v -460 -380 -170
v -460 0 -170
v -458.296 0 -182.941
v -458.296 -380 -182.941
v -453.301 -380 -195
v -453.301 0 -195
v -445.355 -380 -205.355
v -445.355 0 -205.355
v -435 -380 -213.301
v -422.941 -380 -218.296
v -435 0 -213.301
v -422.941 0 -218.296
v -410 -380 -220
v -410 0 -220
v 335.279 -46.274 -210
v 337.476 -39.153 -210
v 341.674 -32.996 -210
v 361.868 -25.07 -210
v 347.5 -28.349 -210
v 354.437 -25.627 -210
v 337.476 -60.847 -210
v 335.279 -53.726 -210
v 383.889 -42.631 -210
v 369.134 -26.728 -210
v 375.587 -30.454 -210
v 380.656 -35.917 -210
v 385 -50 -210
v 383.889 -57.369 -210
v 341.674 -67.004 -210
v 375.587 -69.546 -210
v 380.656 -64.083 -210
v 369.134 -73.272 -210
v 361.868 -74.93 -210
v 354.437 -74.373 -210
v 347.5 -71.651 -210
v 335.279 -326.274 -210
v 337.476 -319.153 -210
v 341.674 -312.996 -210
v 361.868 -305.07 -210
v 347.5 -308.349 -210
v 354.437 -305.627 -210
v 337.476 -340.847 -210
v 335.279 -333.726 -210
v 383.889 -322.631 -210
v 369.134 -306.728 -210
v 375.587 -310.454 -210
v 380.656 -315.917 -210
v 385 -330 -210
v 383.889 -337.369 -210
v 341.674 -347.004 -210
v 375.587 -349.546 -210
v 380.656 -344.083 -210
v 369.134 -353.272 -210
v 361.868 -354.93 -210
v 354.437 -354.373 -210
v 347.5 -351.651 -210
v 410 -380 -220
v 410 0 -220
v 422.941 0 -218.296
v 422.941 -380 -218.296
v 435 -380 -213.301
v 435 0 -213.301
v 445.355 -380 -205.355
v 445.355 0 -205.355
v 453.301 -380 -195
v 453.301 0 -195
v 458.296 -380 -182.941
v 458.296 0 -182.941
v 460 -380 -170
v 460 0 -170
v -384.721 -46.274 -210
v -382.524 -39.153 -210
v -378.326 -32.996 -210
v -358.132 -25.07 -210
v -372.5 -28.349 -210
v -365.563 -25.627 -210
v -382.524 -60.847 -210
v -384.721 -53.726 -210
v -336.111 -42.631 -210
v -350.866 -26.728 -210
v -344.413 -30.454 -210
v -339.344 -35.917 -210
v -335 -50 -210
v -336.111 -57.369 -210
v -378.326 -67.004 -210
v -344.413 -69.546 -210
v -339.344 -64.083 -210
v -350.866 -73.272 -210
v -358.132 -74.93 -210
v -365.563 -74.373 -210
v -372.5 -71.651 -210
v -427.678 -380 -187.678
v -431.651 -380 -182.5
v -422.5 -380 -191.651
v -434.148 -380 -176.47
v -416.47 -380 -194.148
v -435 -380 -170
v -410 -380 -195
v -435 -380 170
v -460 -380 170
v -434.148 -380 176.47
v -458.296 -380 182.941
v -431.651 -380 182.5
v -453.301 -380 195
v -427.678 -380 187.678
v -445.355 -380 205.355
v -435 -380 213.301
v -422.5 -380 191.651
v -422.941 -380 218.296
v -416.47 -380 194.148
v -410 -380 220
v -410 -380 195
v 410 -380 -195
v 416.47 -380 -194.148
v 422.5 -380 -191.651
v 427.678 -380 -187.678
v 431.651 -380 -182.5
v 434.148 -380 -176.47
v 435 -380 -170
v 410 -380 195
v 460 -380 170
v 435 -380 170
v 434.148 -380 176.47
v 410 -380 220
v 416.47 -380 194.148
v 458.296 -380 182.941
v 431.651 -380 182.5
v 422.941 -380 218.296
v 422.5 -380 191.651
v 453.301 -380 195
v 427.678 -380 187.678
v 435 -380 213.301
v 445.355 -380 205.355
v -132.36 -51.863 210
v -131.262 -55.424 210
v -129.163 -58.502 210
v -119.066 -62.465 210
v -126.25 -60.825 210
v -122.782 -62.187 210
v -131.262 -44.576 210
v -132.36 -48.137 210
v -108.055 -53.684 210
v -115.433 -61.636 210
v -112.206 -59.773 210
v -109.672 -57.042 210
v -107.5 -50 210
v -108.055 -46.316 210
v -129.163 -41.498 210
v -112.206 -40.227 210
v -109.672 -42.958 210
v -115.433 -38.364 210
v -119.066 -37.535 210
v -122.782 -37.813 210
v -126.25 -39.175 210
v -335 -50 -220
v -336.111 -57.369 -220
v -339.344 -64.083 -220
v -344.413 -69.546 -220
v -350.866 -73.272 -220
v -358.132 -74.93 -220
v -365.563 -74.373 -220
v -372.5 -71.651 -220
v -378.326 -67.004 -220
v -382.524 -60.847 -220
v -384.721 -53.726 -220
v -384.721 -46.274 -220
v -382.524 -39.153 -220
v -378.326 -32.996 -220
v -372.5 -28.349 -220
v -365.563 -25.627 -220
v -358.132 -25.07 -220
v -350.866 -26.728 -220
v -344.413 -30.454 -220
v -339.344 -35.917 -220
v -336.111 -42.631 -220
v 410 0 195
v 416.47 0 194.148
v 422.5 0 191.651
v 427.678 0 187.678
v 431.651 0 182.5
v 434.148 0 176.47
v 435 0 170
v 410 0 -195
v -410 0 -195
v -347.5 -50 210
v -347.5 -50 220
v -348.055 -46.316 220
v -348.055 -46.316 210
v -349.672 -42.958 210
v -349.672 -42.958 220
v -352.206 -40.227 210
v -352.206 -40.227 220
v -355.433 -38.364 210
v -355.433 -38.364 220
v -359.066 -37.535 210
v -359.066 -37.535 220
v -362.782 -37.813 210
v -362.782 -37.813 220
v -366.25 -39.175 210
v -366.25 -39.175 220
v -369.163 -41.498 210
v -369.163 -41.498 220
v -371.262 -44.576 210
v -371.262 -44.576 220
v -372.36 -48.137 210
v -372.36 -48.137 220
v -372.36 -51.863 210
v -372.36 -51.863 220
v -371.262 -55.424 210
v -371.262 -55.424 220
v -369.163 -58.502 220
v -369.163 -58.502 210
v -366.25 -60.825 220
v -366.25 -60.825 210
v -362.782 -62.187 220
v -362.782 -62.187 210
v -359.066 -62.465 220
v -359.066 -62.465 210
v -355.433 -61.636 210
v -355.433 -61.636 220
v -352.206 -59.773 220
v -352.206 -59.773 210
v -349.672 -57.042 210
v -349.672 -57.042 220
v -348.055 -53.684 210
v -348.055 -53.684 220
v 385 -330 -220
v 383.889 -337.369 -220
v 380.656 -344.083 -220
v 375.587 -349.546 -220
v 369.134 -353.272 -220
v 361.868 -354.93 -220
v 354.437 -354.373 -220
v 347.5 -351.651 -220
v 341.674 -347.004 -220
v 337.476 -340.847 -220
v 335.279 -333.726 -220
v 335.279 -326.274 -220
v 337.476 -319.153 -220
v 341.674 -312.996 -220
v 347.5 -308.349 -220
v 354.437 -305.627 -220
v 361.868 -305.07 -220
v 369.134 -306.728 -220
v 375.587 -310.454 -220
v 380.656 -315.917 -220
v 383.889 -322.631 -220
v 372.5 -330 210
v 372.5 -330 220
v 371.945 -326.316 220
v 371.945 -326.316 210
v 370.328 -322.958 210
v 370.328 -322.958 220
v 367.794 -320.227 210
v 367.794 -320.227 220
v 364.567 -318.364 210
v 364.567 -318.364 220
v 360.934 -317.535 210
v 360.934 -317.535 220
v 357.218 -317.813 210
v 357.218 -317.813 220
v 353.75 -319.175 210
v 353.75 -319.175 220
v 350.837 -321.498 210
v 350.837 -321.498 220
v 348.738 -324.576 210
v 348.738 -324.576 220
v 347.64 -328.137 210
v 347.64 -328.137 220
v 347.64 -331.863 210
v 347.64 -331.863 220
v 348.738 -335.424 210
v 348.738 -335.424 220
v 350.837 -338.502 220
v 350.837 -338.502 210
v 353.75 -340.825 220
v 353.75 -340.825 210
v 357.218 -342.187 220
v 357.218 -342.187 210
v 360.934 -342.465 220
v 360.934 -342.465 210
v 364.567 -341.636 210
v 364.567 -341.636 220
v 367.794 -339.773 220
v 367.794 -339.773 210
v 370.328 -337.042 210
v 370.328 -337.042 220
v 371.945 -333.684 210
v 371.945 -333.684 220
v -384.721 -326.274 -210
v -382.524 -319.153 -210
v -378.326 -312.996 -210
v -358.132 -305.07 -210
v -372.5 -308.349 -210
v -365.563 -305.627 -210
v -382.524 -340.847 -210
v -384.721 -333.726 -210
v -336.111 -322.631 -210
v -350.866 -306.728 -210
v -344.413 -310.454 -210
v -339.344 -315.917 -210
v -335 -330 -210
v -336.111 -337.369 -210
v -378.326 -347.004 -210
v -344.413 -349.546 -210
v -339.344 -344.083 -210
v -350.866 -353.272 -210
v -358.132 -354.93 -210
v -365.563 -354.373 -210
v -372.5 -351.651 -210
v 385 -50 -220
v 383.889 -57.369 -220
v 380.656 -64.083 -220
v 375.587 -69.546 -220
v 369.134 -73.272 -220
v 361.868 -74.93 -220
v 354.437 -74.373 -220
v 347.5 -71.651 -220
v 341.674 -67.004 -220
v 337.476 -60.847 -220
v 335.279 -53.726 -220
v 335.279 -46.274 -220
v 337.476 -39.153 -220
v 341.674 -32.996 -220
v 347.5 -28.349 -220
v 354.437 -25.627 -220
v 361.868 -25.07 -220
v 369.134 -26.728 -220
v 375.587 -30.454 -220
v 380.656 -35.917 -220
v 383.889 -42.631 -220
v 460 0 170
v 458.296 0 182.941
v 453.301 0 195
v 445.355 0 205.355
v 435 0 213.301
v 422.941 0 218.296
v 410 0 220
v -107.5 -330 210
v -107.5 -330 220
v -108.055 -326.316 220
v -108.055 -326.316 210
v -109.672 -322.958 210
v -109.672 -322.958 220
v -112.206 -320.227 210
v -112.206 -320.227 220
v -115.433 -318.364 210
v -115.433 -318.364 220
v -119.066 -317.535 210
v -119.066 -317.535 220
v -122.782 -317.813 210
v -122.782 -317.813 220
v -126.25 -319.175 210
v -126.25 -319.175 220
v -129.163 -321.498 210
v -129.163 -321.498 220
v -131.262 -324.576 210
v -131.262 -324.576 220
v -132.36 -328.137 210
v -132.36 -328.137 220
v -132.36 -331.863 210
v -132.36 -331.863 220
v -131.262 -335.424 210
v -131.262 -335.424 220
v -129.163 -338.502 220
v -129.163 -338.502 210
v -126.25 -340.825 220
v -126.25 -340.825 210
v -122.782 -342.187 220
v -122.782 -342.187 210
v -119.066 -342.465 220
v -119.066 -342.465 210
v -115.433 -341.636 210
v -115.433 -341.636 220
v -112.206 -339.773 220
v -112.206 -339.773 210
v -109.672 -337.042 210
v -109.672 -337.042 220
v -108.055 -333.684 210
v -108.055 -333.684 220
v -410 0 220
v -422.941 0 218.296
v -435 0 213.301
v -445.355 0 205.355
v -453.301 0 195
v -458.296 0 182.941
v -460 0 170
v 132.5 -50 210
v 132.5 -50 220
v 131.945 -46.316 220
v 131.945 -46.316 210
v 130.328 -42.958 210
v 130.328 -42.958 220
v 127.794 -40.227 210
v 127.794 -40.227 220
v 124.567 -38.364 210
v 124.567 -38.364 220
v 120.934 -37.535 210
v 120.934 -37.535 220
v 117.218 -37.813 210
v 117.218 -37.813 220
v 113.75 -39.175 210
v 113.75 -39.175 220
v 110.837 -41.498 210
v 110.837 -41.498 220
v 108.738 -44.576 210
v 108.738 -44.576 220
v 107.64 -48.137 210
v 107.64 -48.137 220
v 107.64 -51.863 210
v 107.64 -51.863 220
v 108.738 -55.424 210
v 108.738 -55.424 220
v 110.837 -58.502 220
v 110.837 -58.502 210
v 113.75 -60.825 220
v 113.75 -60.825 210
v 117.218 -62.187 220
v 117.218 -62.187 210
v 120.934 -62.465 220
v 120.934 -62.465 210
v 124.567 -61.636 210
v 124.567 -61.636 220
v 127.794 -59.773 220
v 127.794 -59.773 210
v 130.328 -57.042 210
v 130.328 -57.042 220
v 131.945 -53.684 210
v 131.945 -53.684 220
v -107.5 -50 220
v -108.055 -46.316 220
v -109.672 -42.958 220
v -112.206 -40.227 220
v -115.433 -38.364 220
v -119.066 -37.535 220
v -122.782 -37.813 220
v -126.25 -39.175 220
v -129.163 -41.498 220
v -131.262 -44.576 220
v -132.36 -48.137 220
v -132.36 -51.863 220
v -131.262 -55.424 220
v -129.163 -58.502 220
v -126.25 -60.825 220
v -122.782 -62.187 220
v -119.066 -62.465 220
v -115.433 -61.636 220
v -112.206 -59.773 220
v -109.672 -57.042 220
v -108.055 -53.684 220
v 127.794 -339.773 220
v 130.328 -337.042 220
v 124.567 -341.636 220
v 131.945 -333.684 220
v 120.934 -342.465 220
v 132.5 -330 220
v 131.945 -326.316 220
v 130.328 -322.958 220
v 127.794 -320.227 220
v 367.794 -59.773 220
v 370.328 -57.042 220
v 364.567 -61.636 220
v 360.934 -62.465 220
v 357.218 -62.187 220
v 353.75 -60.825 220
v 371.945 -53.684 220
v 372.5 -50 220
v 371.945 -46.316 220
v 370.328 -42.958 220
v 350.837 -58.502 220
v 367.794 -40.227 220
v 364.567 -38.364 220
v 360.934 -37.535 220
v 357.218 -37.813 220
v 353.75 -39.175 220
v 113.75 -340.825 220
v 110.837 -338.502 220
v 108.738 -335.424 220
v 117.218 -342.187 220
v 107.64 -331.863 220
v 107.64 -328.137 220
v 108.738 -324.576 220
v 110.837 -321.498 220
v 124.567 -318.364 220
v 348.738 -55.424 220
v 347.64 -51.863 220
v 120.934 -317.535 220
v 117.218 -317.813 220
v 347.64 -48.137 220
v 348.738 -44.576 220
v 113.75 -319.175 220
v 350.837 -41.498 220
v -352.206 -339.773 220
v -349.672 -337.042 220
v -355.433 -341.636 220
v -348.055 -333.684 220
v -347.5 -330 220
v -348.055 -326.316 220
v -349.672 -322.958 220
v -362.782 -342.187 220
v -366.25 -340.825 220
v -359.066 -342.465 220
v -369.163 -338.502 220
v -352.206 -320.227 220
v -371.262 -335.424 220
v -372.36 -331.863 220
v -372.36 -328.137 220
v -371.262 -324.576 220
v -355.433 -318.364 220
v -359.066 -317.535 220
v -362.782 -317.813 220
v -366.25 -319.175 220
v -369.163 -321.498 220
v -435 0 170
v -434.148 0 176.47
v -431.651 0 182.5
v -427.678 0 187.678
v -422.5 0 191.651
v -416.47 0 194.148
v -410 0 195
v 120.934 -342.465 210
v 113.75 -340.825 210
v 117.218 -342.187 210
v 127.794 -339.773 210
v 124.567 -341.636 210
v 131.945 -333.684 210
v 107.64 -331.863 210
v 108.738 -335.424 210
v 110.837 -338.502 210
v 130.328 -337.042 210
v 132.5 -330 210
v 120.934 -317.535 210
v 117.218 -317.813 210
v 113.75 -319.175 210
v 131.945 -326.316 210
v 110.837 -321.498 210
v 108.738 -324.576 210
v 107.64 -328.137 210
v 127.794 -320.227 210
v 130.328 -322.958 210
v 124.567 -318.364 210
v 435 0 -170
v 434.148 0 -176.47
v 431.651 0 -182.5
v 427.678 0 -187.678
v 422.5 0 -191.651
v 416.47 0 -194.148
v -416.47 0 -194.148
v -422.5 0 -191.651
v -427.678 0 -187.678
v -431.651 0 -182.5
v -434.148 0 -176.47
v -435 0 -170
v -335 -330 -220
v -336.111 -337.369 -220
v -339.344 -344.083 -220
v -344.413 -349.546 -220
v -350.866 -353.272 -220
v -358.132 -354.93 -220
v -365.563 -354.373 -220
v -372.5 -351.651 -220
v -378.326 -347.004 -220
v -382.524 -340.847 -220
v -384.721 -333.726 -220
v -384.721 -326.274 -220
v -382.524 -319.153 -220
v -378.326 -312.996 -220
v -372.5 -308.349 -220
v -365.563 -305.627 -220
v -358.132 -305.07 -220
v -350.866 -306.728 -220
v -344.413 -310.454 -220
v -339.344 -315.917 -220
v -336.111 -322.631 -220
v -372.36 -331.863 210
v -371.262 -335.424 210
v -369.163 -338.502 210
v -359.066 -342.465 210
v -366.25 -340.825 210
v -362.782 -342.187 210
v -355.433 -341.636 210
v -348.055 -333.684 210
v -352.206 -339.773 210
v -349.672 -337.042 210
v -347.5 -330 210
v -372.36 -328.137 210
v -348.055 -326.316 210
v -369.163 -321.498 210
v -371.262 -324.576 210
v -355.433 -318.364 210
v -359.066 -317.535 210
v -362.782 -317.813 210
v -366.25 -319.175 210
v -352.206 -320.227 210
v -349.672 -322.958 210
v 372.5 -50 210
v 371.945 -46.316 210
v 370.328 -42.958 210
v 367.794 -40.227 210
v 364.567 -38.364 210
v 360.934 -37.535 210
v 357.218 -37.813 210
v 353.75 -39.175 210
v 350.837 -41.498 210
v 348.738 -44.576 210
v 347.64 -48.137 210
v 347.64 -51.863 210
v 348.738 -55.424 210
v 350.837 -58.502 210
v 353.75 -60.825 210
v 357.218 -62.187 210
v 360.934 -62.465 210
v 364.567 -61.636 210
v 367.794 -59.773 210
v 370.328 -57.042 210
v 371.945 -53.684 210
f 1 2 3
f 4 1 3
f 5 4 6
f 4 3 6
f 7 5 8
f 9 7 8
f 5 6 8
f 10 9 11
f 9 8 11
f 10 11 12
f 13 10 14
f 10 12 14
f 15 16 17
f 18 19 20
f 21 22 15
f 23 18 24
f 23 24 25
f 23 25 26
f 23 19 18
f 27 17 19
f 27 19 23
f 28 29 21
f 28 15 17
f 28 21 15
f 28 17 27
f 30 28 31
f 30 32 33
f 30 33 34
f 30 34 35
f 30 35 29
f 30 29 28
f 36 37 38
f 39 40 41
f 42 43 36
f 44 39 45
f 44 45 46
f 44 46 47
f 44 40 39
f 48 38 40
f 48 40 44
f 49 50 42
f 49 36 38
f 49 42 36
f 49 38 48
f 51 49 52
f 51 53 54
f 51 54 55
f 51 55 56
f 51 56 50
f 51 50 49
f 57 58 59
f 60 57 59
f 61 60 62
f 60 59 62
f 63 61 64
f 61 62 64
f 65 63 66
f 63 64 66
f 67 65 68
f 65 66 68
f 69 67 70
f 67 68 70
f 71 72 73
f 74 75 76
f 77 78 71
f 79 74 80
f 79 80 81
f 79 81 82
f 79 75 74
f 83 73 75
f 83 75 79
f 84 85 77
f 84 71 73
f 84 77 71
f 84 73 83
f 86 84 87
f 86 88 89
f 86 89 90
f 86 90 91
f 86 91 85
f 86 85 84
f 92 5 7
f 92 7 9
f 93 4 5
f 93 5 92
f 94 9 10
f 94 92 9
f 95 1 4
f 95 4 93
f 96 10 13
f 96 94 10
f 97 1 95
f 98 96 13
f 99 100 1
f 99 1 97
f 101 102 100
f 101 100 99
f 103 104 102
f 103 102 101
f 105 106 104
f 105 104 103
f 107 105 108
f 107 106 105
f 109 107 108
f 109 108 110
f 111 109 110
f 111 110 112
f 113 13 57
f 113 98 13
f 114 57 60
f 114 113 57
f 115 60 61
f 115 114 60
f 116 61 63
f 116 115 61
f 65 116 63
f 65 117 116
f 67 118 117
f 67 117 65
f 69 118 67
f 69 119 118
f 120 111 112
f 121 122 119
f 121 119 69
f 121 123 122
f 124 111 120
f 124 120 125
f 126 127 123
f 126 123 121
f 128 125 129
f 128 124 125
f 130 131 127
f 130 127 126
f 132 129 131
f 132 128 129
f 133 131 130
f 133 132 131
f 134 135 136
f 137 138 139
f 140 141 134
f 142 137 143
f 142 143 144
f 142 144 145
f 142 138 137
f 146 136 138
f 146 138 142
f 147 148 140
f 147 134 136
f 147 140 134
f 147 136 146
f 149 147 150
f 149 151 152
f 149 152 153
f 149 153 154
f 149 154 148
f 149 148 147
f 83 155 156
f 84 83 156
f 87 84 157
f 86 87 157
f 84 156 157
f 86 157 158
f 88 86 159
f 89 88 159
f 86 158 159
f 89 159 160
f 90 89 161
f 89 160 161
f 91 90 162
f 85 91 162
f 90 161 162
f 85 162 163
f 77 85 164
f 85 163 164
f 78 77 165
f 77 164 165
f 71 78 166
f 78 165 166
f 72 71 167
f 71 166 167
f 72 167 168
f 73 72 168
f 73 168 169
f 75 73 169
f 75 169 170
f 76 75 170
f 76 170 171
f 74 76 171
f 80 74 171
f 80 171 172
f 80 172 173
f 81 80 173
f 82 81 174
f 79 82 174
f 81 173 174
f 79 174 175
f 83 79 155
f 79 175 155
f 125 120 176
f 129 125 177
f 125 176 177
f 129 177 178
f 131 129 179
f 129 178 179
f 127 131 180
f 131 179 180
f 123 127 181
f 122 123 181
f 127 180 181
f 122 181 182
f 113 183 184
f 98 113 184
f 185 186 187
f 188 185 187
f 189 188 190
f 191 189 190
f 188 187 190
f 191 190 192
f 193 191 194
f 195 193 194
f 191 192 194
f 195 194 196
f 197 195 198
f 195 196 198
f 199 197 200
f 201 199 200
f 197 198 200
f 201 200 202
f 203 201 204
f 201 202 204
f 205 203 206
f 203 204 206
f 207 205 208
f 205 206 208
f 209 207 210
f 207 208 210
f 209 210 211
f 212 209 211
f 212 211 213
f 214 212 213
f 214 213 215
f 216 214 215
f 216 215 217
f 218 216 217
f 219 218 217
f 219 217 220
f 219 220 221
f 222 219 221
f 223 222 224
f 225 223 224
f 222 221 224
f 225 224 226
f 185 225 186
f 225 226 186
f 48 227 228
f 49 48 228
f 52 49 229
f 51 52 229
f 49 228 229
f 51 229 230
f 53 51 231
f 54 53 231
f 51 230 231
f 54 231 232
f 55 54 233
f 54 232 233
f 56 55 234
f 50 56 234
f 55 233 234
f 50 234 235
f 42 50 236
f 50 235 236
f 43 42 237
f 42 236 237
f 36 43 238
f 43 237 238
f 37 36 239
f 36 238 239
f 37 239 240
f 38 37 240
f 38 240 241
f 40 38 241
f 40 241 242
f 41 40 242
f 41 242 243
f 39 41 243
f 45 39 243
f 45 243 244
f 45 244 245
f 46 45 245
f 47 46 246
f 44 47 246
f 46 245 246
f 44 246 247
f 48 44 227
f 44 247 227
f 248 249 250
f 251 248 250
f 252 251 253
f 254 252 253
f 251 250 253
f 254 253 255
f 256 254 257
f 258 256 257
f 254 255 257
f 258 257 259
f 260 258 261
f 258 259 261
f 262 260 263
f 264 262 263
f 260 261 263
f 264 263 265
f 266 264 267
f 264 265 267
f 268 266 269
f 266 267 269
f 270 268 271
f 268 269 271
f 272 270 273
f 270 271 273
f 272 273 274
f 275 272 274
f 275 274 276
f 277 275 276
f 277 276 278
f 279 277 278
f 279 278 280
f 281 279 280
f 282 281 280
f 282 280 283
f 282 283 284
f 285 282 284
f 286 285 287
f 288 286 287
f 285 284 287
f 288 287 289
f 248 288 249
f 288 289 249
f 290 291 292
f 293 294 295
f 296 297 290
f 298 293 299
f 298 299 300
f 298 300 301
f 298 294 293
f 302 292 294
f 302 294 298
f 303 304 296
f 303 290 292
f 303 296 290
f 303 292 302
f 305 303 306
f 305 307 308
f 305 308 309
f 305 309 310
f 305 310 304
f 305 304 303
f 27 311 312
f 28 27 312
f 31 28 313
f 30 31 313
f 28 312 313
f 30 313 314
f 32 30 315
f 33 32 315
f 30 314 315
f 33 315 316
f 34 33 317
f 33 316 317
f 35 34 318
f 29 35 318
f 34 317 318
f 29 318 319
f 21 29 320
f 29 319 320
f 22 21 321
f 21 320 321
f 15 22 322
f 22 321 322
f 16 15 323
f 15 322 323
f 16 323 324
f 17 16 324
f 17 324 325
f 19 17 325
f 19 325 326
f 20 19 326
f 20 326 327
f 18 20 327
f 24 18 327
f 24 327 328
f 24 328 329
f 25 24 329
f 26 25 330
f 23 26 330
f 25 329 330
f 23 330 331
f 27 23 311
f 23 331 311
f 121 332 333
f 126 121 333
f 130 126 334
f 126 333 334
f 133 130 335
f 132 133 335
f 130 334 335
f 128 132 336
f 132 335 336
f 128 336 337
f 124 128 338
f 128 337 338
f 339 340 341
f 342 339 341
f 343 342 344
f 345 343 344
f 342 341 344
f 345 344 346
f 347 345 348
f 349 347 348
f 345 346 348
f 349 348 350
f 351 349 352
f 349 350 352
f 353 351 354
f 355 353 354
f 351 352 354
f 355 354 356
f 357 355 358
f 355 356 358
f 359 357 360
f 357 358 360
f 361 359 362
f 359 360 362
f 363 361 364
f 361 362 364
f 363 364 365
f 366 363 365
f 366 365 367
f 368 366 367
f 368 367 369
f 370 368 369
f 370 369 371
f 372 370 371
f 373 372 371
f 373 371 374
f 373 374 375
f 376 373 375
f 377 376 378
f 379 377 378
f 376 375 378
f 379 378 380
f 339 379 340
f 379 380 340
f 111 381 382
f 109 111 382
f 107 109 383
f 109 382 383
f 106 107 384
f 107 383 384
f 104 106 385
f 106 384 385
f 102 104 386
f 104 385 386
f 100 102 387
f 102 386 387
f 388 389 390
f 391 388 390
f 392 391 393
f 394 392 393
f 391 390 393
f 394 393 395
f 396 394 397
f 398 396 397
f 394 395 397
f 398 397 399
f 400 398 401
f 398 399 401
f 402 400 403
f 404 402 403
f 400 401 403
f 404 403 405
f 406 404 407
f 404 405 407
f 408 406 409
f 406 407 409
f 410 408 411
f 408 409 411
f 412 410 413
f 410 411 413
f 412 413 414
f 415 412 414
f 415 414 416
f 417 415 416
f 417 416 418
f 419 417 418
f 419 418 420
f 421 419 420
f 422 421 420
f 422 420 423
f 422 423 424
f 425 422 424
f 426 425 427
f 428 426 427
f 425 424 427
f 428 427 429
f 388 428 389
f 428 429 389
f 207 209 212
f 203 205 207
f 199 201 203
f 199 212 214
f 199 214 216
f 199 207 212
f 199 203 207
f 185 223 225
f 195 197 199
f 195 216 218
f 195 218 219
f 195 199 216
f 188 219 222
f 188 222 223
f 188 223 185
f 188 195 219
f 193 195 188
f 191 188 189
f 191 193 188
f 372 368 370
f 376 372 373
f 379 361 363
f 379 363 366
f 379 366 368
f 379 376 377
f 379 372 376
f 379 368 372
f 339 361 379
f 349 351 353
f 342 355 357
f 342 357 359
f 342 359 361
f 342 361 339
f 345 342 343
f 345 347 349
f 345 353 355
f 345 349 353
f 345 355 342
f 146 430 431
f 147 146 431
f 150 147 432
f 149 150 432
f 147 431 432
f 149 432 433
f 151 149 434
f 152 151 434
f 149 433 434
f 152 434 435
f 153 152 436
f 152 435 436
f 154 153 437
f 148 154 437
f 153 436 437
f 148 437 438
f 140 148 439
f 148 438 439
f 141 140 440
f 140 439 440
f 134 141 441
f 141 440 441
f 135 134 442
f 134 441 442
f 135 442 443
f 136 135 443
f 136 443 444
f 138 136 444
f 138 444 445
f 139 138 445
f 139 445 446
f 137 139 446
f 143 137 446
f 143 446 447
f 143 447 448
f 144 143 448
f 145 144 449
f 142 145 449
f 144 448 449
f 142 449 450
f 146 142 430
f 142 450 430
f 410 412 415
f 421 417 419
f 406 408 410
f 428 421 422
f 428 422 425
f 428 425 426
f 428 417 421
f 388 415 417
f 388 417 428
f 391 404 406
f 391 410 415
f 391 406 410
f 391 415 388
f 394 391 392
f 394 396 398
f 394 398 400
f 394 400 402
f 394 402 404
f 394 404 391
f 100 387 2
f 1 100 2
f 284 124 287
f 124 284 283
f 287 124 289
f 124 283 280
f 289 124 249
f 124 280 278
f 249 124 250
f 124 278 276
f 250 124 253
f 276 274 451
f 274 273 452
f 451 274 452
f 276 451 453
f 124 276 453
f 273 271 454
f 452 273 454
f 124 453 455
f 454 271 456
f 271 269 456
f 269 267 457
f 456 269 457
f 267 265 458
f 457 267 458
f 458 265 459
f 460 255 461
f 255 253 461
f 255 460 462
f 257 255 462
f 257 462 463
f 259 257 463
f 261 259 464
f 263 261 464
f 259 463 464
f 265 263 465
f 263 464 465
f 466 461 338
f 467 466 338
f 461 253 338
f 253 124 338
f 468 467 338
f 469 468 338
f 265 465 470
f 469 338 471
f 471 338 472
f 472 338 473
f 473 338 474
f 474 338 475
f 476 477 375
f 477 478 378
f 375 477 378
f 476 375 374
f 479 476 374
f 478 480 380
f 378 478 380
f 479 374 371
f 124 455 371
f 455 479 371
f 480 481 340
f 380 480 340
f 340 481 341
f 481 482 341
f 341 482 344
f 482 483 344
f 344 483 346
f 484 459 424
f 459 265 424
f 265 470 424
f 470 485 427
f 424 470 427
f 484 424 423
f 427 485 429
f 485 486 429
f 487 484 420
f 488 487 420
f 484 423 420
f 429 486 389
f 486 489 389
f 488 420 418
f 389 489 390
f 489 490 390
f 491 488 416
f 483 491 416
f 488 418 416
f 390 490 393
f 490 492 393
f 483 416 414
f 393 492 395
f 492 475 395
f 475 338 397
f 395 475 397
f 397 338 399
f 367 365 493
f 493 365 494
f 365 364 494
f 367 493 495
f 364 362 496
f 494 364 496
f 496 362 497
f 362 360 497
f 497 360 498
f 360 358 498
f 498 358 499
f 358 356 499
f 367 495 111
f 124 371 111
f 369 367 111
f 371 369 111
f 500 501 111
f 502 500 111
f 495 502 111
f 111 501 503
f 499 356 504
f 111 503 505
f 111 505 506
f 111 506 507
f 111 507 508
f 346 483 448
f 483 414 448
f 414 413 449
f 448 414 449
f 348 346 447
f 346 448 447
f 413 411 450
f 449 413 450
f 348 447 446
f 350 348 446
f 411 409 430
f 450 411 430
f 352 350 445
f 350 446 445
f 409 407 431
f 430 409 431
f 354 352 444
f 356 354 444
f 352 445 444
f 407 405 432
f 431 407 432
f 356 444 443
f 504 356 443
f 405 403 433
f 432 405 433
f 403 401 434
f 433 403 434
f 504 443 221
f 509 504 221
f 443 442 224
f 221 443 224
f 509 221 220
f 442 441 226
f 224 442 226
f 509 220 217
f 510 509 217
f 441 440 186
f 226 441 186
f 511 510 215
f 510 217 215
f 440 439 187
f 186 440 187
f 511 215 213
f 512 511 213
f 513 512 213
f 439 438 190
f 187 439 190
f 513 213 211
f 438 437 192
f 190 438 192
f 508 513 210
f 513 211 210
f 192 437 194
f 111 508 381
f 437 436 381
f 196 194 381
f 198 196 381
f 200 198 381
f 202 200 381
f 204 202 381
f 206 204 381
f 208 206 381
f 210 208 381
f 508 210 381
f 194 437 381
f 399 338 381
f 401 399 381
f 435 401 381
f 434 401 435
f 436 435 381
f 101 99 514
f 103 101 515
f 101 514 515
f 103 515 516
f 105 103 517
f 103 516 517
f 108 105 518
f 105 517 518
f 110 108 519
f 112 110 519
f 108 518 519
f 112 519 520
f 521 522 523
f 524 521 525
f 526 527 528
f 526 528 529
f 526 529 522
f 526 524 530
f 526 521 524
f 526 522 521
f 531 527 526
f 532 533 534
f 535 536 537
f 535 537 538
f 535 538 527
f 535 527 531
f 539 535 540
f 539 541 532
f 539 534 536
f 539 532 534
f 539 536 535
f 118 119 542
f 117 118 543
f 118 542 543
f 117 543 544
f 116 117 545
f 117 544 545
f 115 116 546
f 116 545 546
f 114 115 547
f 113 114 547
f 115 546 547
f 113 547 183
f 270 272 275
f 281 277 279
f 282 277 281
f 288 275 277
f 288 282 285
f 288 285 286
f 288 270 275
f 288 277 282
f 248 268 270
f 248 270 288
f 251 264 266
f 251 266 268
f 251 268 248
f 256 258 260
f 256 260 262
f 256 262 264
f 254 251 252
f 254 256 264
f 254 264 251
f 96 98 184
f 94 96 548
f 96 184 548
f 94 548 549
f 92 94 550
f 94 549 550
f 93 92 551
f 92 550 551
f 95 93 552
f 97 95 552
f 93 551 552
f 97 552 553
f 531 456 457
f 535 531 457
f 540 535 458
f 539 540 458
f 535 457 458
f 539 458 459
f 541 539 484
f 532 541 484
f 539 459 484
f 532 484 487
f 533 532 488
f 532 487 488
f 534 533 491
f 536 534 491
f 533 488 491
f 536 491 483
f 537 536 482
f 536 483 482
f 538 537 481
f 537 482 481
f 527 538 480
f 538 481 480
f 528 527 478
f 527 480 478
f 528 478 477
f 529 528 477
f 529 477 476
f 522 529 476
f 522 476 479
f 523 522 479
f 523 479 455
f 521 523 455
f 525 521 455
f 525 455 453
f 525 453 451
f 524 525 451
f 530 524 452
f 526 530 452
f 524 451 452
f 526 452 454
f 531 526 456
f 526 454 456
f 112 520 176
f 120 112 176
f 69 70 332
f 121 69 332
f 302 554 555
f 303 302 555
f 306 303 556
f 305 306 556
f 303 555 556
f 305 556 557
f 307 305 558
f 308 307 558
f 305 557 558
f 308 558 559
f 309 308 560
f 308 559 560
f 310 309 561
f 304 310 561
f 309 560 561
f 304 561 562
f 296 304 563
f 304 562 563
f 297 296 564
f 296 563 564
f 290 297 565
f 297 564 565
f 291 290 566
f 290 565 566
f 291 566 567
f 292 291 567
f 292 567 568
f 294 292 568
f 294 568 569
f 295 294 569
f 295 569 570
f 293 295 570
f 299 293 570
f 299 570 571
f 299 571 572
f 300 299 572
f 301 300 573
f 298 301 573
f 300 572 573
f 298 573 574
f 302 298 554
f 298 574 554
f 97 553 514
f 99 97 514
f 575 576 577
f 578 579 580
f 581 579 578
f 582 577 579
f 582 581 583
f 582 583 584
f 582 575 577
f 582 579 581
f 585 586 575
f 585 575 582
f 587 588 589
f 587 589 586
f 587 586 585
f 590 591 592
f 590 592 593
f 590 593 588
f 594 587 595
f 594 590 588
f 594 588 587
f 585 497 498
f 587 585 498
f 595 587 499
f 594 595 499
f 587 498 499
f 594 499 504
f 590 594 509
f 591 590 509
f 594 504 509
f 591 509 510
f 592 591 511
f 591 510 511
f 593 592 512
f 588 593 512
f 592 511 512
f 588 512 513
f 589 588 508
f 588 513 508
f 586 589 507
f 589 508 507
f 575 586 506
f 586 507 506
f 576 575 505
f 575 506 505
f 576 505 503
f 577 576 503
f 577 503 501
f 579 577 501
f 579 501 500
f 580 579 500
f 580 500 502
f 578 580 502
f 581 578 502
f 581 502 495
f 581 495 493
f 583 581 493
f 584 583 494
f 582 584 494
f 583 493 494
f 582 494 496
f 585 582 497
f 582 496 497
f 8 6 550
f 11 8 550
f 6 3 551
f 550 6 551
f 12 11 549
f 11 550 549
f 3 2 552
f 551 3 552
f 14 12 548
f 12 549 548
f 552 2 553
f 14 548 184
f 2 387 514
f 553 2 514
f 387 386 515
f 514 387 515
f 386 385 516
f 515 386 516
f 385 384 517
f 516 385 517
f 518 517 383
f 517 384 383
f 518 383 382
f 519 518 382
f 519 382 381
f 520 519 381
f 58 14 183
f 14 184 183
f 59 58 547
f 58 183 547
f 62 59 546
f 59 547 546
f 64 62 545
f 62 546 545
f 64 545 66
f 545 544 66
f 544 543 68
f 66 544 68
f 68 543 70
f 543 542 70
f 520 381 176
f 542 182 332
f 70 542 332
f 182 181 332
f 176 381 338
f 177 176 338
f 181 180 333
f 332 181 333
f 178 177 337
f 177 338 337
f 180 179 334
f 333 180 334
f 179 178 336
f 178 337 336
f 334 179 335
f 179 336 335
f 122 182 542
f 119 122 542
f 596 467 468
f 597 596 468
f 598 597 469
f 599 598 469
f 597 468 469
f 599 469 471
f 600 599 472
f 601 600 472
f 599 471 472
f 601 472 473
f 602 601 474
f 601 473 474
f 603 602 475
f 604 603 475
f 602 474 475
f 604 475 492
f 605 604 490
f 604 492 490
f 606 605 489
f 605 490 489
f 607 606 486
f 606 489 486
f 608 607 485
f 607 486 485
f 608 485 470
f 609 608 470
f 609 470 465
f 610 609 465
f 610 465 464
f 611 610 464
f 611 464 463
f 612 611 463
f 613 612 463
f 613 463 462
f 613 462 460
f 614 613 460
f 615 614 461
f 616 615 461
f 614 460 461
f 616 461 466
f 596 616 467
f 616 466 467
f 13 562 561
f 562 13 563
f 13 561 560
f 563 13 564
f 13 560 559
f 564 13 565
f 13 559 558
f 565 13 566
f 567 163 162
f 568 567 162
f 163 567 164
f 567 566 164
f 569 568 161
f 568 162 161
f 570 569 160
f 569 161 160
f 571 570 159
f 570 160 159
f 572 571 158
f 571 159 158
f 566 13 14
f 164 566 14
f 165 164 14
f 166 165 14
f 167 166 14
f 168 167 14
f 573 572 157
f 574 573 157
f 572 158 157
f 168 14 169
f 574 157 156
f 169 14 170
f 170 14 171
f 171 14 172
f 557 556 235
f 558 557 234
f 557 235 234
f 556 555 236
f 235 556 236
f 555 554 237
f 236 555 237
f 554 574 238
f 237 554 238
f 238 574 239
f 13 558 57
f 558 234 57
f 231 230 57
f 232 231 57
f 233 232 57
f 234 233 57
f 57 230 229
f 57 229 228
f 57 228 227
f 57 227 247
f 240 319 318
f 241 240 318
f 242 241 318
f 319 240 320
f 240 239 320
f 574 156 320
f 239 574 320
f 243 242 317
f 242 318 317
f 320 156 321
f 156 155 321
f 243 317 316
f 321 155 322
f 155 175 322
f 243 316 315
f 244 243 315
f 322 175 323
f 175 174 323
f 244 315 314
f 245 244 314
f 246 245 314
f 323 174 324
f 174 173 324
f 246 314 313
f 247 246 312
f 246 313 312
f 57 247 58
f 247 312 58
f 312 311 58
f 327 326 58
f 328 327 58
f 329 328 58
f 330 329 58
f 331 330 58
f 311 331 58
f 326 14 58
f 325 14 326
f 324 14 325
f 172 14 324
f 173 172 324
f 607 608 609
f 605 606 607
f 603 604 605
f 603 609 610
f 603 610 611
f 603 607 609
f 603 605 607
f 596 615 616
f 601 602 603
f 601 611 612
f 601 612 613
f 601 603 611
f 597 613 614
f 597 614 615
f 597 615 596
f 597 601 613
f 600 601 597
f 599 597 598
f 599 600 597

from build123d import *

# Parameters (mm, degrees)
F1_DEPTH = 380
F2_R     = 25
F3_DEPTH = 10
F4_R     = 12.5
F5_DEPTH = 10


with BuildPart() as f1:
    # F0 (on Front) → F1 (new body)
    with BuildSketch(Plane.XZ):
        with BuildLine():
            Line((-410, -220), (410, -220))
            ThreePointArc((410, -220), (445.355339, -205.355339), (460, -170))
            Line((460, -170), (460, 170))
            ThreePointArc((460, 170), (445.355339, 205.355339), (410, 220))
            Line((410, 220), (-410, 220))
            ThreePointArc((-410, 220), (-445.355339, 205.355339), (-460, 170))
            Line((-460, 170), (-460, -170))
            ThreePointArc((-460, -170), (-445.355339, -205.355339), (-410, -220))
        make_face()
        with BuildLine():
            ThreePointArc((435, -170), (427.67767, -187.67767), (410, -195))
            Line((410, -195), (-410, -195))
            ThreePointArc((-410, -195), (-427.67767, -187.67767), (-435, -170))
            Line((-435, -170), (-435, 170))
            ThreePointArc((-435, 170), (-427.67767, 187.67767), (-410, 195))
            Line((-410, 195), (410, 195))
            ThreePointArc((410, 195), (427.67767, 187.67767), (435, 170))
            Line((435, 170), (435, -170))
        make_face(mode=Mode.SUBTRACT)
    extrude(amount=F1_DEPTH)

    # F2 (on face) → F3 (cut)
    with BuildSketch(Plane(origin=(0, 0, -220), x_dir=(1, 0, 0), z_dir=(0, 0, -1))):
        with Locations((-360, 50)):
            Circle(F2_R)
        with Locations((-360, 330)):
            Circle(F2_R)
        with Locations((360, 330)):
            Circle(F2_R)
        with Locations((360, 50)):
            Circle(F2_R)
    extrude(amount=-F3_DEPTH, mode=Mode.SUBTRACT)

    # F4 (on face) → F5 (cut)
    with BuildSketch(Plane.XY.offset(220)):
        with Locations((-360, -50)):
            Circle(F4_R)
        with Locations((-360, -330)):
            Circle(F4_R)
        with Locations((-120, -330)):
            Circle(F4_R)
        with Locations((-120, -50)):
            Circle(F4_R)
        with Locations((120, -330)):
            Circle(F4_R)
        with Locations((120, -50)):
            Circle(F4_R)
        with Locations((360, -330)):
            Circle(F4_R)
        with Locations((360, -50)):
            Circle(F4_R)
    extrude(amount=-F5_DEPTH, mode=Mode.SUBTRACT)


solid = f1.part
